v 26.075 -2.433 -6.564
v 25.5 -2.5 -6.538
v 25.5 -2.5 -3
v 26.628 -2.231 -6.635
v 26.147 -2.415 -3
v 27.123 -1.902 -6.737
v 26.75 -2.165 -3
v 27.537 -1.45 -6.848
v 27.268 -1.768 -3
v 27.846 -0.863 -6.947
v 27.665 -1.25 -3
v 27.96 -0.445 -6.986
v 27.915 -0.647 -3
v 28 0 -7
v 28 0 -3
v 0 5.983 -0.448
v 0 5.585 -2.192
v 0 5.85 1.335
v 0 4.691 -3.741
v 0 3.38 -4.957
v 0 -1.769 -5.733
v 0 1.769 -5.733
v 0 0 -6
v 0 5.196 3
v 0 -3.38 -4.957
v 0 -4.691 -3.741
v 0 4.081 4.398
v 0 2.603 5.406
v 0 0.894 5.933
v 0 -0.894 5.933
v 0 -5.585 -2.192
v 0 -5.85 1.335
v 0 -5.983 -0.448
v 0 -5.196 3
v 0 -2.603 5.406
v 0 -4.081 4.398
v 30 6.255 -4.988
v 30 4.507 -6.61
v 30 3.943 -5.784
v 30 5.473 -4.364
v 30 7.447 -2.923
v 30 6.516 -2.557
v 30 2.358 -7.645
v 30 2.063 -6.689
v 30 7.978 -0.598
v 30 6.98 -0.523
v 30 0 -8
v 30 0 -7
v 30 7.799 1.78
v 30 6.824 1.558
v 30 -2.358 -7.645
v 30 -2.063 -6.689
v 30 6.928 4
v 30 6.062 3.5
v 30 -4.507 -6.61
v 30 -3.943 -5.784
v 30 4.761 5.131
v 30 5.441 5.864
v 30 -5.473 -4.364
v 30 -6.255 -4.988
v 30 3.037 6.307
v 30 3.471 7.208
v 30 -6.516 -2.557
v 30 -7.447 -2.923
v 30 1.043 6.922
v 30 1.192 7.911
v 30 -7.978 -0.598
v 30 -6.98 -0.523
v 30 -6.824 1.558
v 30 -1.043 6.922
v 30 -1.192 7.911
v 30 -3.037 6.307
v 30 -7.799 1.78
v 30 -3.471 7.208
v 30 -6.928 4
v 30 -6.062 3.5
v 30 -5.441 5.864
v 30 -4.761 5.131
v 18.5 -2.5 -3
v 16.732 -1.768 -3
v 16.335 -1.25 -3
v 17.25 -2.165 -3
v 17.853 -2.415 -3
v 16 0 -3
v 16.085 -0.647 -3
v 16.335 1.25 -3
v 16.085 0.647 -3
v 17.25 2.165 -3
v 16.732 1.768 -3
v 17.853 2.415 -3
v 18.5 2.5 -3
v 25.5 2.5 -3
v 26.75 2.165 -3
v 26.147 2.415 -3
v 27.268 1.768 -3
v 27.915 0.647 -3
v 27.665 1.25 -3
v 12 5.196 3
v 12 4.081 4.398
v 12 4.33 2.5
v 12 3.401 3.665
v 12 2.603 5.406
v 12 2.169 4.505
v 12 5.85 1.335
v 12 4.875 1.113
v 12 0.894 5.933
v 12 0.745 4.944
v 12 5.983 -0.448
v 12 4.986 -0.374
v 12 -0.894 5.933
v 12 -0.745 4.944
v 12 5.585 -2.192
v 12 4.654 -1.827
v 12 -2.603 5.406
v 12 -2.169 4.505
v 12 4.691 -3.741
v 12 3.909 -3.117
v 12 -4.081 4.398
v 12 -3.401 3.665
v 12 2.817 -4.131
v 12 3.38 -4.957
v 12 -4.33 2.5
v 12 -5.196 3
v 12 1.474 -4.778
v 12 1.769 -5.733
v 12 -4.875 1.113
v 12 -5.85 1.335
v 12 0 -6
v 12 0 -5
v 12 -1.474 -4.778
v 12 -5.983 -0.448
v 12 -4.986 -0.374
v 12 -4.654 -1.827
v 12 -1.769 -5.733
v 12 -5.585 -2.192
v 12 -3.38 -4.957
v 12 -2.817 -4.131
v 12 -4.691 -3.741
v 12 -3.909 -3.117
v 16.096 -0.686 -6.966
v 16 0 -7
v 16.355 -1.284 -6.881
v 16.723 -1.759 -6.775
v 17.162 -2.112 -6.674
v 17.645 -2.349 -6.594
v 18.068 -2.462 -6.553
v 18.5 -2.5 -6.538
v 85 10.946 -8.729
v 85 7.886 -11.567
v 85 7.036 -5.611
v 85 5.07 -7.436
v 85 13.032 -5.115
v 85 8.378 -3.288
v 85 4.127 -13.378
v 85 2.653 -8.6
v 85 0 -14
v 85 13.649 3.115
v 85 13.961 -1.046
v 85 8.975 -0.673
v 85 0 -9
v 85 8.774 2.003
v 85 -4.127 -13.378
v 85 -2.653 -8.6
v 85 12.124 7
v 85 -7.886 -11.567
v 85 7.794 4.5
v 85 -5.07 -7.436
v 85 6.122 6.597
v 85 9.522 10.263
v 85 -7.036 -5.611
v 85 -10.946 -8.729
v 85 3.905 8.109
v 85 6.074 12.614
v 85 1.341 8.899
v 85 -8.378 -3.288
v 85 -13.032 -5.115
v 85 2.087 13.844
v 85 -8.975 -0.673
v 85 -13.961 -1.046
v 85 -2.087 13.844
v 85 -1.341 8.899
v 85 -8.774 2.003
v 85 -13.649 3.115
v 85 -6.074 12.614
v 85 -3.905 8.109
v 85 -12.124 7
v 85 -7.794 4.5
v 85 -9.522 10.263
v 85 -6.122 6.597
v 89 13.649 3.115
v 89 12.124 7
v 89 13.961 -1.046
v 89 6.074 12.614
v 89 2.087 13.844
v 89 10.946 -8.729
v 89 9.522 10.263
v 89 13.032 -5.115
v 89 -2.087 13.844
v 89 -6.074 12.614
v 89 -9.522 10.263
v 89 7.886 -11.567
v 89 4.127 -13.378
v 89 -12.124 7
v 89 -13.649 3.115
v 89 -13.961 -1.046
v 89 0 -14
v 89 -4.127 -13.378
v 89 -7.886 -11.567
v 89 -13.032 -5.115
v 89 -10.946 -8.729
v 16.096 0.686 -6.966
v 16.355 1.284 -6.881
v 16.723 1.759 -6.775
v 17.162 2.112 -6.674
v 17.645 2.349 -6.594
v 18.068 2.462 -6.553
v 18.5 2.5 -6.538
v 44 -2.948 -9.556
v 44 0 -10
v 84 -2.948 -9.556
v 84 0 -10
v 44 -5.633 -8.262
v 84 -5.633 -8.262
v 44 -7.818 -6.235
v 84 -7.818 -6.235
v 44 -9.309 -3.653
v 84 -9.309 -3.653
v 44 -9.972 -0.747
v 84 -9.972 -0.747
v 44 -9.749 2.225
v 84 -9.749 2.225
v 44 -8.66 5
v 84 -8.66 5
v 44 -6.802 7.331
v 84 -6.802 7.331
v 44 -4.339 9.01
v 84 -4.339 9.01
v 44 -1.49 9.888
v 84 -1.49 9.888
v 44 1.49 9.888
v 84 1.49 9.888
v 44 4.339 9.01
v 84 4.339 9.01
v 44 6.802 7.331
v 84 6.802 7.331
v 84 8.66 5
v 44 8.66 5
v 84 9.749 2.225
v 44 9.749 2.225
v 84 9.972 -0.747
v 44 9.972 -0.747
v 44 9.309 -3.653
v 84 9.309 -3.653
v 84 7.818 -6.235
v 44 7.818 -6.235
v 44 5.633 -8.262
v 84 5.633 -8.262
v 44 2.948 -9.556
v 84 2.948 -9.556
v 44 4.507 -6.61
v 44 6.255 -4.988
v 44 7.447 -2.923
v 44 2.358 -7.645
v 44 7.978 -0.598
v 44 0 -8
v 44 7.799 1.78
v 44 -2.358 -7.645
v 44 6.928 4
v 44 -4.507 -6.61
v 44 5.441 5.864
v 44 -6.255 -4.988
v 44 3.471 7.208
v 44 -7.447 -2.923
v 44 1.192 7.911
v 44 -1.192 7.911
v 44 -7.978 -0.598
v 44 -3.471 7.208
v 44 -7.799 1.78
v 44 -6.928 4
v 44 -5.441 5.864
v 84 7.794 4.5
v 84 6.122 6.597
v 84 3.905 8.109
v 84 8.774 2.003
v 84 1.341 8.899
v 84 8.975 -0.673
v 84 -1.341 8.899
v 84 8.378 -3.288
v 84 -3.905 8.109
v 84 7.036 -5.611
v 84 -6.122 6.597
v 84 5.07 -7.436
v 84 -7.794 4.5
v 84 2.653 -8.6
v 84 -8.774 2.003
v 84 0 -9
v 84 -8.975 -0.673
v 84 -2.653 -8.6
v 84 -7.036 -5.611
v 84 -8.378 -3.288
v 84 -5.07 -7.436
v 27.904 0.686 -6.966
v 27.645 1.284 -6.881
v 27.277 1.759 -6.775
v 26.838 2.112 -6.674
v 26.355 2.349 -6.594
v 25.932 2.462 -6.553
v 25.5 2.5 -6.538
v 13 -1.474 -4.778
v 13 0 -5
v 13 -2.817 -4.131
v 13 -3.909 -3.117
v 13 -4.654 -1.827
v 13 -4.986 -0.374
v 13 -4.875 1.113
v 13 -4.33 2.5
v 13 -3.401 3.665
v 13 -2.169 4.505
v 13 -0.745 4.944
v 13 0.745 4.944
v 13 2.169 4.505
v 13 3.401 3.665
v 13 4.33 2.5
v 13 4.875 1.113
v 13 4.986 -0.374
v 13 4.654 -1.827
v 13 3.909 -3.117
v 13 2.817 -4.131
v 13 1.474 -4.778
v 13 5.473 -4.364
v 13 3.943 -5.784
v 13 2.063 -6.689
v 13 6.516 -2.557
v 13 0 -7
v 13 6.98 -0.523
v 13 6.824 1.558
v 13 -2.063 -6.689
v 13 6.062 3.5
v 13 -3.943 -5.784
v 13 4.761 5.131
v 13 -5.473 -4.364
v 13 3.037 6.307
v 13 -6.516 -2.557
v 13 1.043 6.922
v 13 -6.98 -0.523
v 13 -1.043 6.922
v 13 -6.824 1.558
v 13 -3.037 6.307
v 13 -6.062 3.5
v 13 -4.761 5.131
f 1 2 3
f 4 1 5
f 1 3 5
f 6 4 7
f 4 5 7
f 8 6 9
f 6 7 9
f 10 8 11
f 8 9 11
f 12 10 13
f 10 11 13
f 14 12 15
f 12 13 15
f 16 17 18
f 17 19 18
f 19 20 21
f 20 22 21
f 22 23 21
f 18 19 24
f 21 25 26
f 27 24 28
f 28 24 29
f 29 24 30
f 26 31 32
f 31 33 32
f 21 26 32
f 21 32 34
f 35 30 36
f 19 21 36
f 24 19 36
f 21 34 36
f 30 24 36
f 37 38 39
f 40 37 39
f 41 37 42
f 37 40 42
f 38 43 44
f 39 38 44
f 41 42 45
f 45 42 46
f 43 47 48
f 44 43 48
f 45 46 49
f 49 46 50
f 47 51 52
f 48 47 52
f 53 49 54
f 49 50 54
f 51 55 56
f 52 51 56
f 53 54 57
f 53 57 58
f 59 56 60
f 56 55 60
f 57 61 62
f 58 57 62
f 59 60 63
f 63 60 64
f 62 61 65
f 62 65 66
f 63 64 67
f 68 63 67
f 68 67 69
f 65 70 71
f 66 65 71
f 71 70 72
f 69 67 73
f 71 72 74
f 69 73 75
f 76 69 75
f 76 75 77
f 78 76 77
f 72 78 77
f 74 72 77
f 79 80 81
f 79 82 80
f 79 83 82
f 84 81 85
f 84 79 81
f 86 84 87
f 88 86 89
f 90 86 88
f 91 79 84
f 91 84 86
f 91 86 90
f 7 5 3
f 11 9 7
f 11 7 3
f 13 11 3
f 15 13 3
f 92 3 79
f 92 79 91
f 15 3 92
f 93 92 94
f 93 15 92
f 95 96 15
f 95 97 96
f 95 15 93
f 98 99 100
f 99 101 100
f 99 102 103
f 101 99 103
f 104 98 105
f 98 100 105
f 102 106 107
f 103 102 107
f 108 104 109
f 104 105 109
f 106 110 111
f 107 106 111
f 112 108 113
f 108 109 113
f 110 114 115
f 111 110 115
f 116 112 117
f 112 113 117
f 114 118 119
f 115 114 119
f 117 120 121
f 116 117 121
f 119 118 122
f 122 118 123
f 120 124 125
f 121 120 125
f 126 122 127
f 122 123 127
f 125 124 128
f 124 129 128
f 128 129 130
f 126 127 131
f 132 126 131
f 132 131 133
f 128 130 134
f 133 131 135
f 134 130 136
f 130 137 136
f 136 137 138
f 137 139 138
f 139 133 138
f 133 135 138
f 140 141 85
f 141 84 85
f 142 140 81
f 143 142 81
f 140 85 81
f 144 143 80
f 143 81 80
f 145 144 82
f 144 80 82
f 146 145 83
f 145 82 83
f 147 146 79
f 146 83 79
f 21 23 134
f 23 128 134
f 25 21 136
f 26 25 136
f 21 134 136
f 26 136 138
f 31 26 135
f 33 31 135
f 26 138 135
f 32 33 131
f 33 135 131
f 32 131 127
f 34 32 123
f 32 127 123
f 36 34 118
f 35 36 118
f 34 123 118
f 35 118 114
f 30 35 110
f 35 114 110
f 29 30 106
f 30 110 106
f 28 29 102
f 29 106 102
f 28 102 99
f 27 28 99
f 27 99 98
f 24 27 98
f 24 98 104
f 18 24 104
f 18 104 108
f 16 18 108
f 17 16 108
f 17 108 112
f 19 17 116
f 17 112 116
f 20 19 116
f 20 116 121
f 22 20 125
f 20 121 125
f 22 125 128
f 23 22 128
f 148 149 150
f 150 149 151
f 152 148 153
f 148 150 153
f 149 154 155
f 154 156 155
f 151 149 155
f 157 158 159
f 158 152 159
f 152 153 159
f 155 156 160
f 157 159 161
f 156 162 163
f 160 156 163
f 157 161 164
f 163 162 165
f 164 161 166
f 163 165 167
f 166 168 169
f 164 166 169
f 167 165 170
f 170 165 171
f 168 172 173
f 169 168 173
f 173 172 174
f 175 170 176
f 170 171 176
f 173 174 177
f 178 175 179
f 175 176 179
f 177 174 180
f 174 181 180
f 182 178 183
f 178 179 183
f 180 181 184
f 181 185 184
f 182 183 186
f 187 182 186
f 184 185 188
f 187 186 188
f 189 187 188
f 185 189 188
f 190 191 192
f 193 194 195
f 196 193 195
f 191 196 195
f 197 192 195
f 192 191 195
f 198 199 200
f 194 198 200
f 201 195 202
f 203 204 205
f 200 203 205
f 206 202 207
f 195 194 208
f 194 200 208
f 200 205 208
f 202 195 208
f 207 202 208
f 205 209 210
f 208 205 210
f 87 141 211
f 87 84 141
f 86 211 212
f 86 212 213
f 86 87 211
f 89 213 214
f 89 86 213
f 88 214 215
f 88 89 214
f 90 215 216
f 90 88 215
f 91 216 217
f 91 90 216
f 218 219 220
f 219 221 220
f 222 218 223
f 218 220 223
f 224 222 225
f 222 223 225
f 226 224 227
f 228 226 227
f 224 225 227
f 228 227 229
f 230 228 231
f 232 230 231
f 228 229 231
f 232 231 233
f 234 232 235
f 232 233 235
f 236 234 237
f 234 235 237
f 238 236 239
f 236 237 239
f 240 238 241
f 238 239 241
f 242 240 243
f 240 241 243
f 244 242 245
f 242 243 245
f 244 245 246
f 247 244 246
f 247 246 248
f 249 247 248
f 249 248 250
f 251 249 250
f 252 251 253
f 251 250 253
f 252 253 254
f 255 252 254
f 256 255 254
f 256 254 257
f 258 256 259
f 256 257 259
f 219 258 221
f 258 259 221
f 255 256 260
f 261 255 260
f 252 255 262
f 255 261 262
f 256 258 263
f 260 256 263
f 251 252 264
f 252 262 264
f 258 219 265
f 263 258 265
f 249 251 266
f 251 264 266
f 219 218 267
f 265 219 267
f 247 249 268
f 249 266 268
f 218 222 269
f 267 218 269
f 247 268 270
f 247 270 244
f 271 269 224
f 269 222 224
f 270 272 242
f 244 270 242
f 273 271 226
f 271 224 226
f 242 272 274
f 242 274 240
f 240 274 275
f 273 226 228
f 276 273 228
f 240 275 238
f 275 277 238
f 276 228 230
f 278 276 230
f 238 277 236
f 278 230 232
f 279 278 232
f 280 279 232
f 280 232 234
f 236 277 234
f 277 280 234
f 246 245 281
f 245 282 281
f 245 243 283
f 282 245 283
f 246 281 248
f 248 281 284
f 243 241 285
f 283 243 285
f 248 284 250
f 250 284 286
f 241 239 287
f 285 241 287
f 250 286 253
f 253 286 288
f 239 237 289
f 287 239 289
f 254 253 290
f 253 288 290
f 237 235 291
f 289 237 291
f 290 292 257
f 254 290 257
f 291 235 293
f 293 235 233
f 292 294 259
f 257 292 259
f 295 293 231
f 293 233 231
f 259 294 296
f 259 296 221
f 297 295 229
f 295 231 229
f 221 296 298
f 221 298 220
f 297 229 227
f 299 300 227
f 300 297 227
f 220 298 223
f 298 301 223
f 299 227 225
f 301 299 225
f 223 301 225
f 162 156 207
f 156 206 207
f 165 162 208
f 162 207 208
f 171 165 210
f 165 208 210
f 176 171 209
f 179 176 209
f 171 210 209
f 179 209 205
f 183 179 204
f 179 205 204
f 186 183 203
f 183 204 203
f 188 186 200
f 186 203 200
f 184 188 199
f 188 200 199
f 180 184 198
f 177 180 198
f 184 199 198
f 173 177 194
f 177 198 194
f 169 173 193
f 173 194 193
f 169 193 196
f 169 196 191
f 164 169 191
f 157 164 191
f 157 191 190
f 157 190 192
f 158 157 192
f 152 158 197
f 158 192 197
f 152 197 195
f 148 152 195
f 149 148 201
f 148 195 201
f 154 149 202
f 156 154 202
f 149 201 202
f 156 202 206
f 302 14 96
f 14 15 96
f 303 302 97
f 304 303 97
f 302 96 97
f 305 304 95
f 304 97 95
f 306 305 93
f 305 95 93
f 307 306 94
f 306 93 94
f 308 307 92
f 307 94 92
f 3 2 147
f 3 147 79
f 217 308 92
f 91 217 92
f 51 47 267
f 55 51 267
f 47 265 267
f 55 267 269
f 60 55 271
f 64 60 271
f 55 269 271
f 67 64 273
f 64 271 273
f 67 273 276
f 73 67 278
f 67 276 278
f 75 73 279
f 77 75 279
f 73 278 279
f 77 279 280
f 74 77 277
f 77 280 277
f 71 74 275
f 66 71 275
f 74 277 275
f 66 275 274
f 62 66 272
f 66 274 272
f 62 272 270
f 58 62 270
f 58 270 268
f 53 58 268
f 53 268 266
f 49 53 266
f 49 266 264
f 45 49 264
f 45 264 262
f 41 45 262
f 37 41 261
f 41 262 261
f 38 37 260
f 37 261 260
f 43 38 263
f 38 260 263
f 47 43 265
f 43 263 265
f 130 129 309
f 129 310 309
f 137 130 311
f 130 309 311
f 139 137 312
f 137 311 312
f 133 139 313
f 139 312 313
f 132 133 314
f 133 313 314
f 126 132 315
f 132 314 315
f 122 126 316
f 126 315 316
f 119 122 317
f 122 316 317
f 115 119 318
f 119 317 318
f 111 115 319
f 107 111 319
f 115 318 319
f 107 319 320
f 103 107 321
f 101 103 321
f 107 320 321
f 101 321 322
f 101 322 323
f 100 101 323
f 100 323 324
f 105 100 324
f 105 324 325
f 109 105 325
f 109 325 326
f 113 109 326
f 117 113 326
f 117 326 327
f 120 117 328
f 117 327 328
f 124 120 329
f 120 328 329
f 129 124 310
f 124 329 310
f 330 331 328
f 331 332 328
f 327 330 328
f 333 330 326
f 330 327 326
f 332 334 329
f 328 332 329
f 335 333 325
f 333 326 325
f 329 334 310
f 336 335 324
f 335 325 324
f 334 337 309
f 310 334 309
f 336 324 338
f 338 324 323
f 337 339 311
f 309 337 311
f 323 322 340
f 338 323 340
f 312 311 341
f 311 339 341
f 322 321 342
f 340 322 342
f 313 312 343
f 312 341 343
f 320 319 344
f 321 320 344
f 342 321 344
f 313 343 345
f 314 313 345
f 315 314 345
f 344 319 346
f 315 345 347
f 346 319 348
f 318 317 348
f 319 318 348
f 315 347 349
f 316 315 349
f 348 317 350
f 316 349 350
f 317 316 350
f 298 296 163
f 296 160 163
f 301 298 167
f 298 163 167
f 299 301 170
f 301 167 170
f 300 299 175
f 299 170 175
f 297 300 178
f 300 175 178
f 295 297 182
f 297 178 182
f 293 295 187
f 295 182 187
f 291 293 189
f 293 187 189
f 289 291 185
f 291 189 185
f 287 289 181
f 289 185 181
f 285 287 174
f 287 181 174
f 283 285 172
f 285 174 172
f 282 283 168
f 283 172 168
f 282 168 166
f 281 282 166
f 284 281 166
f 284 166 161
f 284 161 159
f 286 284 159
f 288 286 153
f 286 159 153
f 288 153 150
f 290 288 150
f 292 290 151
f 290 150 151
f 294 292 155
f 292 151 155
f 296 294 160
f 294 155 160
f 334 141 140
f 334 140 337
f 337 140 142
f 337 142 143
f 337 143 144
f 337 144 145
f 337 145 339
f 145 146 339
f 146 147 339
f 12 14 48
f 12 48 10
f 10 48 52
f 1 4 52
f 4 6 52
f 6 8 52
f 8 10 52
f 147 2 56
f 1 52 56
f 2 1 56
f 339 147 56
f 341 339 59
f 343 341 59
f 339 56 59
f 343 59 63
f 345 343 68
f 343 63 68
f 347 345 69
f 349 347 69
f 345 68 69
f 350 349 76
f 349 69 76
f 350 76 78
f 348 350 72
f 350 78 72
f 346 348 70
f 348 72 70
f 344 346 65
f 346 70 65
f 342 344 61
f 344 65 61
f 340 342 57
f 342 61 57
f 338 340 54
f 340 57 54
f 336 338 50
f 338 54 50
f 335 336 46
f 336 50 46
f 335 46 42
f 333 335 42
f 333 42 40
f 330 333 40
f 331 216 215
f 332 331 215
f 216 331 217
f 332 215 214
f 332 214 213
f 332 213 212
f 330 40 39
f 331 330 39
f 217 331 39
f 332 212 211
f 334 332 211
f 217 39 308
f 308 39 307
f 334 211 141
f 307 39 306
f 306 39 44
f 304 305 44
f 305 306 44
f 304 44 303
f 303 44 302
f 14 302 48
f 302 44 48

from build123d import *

# Parameters (mm, degrees)
SKETCH_2_W          = 4.549870692
SKETCH_2_H          = 5
CUT_EXTRUDE_1_DEPTH = 12
FILLET_1_R          = 2.5
FILLET_2_R          = 2.5


with BuildPart() as part:
    # 草图1 → 旋转1 (revolve)
    with BuildSketch(Plane.XY, mode=Mode.PRIVATE) as revolve_1_sk:
        Polygon((0, 0), (0, 6), (12, 6), (12, 5), (13, 5), (13, 7), (30, 7), (30, 8), (44, 8), (44, 10), (84, 10), (84, 9), (85, 9), (85, 14), (89, 14), (89, 0), align=None)
    revolve(revolve_1_sk.sketch.rotate(Axis((0, 0, 0), (-1, 0, 0)), 90), axis=Axis((0, 0, 0), (-1, 0, 0)))

    # 草图2 → 切除-拉伸1 (cut)
    with BuildSketch(Plane.ZY.offset(-28)):
        with Locations((-5.274935346, 0)):
            Rectangle(SKETCH_2_W, SKETCH_2_H)
    extrude(amount=CUT_EXTRUDE_1_DEPTH, mode=Mode.SUBTRACT)

    # 圆角1
    fillet_1_edges = [part.edges().sort_by_distance(p)[0] for p in [
        (16, -2.5, -4.769174208),
        (16, 2.5, -4.769174208),
    ]]
    fillet(fillet_1_edges, radius=FILLET_1_R - 0.0001)  # a hair under: the kernel refuses the full size

    # 圆角2
    fillet_2_edges = [part.edges().sort_by_distance(p)[0] for p in [
        (28, 2.5, -4.769174208),
        (28, -2.5, -4.769174208),
    ]]
    fillet(fillet_2_edges, radius=FILLET_2_R - 0.0001)  # a hair under: the kernel refuses the full size


solid = part.part
